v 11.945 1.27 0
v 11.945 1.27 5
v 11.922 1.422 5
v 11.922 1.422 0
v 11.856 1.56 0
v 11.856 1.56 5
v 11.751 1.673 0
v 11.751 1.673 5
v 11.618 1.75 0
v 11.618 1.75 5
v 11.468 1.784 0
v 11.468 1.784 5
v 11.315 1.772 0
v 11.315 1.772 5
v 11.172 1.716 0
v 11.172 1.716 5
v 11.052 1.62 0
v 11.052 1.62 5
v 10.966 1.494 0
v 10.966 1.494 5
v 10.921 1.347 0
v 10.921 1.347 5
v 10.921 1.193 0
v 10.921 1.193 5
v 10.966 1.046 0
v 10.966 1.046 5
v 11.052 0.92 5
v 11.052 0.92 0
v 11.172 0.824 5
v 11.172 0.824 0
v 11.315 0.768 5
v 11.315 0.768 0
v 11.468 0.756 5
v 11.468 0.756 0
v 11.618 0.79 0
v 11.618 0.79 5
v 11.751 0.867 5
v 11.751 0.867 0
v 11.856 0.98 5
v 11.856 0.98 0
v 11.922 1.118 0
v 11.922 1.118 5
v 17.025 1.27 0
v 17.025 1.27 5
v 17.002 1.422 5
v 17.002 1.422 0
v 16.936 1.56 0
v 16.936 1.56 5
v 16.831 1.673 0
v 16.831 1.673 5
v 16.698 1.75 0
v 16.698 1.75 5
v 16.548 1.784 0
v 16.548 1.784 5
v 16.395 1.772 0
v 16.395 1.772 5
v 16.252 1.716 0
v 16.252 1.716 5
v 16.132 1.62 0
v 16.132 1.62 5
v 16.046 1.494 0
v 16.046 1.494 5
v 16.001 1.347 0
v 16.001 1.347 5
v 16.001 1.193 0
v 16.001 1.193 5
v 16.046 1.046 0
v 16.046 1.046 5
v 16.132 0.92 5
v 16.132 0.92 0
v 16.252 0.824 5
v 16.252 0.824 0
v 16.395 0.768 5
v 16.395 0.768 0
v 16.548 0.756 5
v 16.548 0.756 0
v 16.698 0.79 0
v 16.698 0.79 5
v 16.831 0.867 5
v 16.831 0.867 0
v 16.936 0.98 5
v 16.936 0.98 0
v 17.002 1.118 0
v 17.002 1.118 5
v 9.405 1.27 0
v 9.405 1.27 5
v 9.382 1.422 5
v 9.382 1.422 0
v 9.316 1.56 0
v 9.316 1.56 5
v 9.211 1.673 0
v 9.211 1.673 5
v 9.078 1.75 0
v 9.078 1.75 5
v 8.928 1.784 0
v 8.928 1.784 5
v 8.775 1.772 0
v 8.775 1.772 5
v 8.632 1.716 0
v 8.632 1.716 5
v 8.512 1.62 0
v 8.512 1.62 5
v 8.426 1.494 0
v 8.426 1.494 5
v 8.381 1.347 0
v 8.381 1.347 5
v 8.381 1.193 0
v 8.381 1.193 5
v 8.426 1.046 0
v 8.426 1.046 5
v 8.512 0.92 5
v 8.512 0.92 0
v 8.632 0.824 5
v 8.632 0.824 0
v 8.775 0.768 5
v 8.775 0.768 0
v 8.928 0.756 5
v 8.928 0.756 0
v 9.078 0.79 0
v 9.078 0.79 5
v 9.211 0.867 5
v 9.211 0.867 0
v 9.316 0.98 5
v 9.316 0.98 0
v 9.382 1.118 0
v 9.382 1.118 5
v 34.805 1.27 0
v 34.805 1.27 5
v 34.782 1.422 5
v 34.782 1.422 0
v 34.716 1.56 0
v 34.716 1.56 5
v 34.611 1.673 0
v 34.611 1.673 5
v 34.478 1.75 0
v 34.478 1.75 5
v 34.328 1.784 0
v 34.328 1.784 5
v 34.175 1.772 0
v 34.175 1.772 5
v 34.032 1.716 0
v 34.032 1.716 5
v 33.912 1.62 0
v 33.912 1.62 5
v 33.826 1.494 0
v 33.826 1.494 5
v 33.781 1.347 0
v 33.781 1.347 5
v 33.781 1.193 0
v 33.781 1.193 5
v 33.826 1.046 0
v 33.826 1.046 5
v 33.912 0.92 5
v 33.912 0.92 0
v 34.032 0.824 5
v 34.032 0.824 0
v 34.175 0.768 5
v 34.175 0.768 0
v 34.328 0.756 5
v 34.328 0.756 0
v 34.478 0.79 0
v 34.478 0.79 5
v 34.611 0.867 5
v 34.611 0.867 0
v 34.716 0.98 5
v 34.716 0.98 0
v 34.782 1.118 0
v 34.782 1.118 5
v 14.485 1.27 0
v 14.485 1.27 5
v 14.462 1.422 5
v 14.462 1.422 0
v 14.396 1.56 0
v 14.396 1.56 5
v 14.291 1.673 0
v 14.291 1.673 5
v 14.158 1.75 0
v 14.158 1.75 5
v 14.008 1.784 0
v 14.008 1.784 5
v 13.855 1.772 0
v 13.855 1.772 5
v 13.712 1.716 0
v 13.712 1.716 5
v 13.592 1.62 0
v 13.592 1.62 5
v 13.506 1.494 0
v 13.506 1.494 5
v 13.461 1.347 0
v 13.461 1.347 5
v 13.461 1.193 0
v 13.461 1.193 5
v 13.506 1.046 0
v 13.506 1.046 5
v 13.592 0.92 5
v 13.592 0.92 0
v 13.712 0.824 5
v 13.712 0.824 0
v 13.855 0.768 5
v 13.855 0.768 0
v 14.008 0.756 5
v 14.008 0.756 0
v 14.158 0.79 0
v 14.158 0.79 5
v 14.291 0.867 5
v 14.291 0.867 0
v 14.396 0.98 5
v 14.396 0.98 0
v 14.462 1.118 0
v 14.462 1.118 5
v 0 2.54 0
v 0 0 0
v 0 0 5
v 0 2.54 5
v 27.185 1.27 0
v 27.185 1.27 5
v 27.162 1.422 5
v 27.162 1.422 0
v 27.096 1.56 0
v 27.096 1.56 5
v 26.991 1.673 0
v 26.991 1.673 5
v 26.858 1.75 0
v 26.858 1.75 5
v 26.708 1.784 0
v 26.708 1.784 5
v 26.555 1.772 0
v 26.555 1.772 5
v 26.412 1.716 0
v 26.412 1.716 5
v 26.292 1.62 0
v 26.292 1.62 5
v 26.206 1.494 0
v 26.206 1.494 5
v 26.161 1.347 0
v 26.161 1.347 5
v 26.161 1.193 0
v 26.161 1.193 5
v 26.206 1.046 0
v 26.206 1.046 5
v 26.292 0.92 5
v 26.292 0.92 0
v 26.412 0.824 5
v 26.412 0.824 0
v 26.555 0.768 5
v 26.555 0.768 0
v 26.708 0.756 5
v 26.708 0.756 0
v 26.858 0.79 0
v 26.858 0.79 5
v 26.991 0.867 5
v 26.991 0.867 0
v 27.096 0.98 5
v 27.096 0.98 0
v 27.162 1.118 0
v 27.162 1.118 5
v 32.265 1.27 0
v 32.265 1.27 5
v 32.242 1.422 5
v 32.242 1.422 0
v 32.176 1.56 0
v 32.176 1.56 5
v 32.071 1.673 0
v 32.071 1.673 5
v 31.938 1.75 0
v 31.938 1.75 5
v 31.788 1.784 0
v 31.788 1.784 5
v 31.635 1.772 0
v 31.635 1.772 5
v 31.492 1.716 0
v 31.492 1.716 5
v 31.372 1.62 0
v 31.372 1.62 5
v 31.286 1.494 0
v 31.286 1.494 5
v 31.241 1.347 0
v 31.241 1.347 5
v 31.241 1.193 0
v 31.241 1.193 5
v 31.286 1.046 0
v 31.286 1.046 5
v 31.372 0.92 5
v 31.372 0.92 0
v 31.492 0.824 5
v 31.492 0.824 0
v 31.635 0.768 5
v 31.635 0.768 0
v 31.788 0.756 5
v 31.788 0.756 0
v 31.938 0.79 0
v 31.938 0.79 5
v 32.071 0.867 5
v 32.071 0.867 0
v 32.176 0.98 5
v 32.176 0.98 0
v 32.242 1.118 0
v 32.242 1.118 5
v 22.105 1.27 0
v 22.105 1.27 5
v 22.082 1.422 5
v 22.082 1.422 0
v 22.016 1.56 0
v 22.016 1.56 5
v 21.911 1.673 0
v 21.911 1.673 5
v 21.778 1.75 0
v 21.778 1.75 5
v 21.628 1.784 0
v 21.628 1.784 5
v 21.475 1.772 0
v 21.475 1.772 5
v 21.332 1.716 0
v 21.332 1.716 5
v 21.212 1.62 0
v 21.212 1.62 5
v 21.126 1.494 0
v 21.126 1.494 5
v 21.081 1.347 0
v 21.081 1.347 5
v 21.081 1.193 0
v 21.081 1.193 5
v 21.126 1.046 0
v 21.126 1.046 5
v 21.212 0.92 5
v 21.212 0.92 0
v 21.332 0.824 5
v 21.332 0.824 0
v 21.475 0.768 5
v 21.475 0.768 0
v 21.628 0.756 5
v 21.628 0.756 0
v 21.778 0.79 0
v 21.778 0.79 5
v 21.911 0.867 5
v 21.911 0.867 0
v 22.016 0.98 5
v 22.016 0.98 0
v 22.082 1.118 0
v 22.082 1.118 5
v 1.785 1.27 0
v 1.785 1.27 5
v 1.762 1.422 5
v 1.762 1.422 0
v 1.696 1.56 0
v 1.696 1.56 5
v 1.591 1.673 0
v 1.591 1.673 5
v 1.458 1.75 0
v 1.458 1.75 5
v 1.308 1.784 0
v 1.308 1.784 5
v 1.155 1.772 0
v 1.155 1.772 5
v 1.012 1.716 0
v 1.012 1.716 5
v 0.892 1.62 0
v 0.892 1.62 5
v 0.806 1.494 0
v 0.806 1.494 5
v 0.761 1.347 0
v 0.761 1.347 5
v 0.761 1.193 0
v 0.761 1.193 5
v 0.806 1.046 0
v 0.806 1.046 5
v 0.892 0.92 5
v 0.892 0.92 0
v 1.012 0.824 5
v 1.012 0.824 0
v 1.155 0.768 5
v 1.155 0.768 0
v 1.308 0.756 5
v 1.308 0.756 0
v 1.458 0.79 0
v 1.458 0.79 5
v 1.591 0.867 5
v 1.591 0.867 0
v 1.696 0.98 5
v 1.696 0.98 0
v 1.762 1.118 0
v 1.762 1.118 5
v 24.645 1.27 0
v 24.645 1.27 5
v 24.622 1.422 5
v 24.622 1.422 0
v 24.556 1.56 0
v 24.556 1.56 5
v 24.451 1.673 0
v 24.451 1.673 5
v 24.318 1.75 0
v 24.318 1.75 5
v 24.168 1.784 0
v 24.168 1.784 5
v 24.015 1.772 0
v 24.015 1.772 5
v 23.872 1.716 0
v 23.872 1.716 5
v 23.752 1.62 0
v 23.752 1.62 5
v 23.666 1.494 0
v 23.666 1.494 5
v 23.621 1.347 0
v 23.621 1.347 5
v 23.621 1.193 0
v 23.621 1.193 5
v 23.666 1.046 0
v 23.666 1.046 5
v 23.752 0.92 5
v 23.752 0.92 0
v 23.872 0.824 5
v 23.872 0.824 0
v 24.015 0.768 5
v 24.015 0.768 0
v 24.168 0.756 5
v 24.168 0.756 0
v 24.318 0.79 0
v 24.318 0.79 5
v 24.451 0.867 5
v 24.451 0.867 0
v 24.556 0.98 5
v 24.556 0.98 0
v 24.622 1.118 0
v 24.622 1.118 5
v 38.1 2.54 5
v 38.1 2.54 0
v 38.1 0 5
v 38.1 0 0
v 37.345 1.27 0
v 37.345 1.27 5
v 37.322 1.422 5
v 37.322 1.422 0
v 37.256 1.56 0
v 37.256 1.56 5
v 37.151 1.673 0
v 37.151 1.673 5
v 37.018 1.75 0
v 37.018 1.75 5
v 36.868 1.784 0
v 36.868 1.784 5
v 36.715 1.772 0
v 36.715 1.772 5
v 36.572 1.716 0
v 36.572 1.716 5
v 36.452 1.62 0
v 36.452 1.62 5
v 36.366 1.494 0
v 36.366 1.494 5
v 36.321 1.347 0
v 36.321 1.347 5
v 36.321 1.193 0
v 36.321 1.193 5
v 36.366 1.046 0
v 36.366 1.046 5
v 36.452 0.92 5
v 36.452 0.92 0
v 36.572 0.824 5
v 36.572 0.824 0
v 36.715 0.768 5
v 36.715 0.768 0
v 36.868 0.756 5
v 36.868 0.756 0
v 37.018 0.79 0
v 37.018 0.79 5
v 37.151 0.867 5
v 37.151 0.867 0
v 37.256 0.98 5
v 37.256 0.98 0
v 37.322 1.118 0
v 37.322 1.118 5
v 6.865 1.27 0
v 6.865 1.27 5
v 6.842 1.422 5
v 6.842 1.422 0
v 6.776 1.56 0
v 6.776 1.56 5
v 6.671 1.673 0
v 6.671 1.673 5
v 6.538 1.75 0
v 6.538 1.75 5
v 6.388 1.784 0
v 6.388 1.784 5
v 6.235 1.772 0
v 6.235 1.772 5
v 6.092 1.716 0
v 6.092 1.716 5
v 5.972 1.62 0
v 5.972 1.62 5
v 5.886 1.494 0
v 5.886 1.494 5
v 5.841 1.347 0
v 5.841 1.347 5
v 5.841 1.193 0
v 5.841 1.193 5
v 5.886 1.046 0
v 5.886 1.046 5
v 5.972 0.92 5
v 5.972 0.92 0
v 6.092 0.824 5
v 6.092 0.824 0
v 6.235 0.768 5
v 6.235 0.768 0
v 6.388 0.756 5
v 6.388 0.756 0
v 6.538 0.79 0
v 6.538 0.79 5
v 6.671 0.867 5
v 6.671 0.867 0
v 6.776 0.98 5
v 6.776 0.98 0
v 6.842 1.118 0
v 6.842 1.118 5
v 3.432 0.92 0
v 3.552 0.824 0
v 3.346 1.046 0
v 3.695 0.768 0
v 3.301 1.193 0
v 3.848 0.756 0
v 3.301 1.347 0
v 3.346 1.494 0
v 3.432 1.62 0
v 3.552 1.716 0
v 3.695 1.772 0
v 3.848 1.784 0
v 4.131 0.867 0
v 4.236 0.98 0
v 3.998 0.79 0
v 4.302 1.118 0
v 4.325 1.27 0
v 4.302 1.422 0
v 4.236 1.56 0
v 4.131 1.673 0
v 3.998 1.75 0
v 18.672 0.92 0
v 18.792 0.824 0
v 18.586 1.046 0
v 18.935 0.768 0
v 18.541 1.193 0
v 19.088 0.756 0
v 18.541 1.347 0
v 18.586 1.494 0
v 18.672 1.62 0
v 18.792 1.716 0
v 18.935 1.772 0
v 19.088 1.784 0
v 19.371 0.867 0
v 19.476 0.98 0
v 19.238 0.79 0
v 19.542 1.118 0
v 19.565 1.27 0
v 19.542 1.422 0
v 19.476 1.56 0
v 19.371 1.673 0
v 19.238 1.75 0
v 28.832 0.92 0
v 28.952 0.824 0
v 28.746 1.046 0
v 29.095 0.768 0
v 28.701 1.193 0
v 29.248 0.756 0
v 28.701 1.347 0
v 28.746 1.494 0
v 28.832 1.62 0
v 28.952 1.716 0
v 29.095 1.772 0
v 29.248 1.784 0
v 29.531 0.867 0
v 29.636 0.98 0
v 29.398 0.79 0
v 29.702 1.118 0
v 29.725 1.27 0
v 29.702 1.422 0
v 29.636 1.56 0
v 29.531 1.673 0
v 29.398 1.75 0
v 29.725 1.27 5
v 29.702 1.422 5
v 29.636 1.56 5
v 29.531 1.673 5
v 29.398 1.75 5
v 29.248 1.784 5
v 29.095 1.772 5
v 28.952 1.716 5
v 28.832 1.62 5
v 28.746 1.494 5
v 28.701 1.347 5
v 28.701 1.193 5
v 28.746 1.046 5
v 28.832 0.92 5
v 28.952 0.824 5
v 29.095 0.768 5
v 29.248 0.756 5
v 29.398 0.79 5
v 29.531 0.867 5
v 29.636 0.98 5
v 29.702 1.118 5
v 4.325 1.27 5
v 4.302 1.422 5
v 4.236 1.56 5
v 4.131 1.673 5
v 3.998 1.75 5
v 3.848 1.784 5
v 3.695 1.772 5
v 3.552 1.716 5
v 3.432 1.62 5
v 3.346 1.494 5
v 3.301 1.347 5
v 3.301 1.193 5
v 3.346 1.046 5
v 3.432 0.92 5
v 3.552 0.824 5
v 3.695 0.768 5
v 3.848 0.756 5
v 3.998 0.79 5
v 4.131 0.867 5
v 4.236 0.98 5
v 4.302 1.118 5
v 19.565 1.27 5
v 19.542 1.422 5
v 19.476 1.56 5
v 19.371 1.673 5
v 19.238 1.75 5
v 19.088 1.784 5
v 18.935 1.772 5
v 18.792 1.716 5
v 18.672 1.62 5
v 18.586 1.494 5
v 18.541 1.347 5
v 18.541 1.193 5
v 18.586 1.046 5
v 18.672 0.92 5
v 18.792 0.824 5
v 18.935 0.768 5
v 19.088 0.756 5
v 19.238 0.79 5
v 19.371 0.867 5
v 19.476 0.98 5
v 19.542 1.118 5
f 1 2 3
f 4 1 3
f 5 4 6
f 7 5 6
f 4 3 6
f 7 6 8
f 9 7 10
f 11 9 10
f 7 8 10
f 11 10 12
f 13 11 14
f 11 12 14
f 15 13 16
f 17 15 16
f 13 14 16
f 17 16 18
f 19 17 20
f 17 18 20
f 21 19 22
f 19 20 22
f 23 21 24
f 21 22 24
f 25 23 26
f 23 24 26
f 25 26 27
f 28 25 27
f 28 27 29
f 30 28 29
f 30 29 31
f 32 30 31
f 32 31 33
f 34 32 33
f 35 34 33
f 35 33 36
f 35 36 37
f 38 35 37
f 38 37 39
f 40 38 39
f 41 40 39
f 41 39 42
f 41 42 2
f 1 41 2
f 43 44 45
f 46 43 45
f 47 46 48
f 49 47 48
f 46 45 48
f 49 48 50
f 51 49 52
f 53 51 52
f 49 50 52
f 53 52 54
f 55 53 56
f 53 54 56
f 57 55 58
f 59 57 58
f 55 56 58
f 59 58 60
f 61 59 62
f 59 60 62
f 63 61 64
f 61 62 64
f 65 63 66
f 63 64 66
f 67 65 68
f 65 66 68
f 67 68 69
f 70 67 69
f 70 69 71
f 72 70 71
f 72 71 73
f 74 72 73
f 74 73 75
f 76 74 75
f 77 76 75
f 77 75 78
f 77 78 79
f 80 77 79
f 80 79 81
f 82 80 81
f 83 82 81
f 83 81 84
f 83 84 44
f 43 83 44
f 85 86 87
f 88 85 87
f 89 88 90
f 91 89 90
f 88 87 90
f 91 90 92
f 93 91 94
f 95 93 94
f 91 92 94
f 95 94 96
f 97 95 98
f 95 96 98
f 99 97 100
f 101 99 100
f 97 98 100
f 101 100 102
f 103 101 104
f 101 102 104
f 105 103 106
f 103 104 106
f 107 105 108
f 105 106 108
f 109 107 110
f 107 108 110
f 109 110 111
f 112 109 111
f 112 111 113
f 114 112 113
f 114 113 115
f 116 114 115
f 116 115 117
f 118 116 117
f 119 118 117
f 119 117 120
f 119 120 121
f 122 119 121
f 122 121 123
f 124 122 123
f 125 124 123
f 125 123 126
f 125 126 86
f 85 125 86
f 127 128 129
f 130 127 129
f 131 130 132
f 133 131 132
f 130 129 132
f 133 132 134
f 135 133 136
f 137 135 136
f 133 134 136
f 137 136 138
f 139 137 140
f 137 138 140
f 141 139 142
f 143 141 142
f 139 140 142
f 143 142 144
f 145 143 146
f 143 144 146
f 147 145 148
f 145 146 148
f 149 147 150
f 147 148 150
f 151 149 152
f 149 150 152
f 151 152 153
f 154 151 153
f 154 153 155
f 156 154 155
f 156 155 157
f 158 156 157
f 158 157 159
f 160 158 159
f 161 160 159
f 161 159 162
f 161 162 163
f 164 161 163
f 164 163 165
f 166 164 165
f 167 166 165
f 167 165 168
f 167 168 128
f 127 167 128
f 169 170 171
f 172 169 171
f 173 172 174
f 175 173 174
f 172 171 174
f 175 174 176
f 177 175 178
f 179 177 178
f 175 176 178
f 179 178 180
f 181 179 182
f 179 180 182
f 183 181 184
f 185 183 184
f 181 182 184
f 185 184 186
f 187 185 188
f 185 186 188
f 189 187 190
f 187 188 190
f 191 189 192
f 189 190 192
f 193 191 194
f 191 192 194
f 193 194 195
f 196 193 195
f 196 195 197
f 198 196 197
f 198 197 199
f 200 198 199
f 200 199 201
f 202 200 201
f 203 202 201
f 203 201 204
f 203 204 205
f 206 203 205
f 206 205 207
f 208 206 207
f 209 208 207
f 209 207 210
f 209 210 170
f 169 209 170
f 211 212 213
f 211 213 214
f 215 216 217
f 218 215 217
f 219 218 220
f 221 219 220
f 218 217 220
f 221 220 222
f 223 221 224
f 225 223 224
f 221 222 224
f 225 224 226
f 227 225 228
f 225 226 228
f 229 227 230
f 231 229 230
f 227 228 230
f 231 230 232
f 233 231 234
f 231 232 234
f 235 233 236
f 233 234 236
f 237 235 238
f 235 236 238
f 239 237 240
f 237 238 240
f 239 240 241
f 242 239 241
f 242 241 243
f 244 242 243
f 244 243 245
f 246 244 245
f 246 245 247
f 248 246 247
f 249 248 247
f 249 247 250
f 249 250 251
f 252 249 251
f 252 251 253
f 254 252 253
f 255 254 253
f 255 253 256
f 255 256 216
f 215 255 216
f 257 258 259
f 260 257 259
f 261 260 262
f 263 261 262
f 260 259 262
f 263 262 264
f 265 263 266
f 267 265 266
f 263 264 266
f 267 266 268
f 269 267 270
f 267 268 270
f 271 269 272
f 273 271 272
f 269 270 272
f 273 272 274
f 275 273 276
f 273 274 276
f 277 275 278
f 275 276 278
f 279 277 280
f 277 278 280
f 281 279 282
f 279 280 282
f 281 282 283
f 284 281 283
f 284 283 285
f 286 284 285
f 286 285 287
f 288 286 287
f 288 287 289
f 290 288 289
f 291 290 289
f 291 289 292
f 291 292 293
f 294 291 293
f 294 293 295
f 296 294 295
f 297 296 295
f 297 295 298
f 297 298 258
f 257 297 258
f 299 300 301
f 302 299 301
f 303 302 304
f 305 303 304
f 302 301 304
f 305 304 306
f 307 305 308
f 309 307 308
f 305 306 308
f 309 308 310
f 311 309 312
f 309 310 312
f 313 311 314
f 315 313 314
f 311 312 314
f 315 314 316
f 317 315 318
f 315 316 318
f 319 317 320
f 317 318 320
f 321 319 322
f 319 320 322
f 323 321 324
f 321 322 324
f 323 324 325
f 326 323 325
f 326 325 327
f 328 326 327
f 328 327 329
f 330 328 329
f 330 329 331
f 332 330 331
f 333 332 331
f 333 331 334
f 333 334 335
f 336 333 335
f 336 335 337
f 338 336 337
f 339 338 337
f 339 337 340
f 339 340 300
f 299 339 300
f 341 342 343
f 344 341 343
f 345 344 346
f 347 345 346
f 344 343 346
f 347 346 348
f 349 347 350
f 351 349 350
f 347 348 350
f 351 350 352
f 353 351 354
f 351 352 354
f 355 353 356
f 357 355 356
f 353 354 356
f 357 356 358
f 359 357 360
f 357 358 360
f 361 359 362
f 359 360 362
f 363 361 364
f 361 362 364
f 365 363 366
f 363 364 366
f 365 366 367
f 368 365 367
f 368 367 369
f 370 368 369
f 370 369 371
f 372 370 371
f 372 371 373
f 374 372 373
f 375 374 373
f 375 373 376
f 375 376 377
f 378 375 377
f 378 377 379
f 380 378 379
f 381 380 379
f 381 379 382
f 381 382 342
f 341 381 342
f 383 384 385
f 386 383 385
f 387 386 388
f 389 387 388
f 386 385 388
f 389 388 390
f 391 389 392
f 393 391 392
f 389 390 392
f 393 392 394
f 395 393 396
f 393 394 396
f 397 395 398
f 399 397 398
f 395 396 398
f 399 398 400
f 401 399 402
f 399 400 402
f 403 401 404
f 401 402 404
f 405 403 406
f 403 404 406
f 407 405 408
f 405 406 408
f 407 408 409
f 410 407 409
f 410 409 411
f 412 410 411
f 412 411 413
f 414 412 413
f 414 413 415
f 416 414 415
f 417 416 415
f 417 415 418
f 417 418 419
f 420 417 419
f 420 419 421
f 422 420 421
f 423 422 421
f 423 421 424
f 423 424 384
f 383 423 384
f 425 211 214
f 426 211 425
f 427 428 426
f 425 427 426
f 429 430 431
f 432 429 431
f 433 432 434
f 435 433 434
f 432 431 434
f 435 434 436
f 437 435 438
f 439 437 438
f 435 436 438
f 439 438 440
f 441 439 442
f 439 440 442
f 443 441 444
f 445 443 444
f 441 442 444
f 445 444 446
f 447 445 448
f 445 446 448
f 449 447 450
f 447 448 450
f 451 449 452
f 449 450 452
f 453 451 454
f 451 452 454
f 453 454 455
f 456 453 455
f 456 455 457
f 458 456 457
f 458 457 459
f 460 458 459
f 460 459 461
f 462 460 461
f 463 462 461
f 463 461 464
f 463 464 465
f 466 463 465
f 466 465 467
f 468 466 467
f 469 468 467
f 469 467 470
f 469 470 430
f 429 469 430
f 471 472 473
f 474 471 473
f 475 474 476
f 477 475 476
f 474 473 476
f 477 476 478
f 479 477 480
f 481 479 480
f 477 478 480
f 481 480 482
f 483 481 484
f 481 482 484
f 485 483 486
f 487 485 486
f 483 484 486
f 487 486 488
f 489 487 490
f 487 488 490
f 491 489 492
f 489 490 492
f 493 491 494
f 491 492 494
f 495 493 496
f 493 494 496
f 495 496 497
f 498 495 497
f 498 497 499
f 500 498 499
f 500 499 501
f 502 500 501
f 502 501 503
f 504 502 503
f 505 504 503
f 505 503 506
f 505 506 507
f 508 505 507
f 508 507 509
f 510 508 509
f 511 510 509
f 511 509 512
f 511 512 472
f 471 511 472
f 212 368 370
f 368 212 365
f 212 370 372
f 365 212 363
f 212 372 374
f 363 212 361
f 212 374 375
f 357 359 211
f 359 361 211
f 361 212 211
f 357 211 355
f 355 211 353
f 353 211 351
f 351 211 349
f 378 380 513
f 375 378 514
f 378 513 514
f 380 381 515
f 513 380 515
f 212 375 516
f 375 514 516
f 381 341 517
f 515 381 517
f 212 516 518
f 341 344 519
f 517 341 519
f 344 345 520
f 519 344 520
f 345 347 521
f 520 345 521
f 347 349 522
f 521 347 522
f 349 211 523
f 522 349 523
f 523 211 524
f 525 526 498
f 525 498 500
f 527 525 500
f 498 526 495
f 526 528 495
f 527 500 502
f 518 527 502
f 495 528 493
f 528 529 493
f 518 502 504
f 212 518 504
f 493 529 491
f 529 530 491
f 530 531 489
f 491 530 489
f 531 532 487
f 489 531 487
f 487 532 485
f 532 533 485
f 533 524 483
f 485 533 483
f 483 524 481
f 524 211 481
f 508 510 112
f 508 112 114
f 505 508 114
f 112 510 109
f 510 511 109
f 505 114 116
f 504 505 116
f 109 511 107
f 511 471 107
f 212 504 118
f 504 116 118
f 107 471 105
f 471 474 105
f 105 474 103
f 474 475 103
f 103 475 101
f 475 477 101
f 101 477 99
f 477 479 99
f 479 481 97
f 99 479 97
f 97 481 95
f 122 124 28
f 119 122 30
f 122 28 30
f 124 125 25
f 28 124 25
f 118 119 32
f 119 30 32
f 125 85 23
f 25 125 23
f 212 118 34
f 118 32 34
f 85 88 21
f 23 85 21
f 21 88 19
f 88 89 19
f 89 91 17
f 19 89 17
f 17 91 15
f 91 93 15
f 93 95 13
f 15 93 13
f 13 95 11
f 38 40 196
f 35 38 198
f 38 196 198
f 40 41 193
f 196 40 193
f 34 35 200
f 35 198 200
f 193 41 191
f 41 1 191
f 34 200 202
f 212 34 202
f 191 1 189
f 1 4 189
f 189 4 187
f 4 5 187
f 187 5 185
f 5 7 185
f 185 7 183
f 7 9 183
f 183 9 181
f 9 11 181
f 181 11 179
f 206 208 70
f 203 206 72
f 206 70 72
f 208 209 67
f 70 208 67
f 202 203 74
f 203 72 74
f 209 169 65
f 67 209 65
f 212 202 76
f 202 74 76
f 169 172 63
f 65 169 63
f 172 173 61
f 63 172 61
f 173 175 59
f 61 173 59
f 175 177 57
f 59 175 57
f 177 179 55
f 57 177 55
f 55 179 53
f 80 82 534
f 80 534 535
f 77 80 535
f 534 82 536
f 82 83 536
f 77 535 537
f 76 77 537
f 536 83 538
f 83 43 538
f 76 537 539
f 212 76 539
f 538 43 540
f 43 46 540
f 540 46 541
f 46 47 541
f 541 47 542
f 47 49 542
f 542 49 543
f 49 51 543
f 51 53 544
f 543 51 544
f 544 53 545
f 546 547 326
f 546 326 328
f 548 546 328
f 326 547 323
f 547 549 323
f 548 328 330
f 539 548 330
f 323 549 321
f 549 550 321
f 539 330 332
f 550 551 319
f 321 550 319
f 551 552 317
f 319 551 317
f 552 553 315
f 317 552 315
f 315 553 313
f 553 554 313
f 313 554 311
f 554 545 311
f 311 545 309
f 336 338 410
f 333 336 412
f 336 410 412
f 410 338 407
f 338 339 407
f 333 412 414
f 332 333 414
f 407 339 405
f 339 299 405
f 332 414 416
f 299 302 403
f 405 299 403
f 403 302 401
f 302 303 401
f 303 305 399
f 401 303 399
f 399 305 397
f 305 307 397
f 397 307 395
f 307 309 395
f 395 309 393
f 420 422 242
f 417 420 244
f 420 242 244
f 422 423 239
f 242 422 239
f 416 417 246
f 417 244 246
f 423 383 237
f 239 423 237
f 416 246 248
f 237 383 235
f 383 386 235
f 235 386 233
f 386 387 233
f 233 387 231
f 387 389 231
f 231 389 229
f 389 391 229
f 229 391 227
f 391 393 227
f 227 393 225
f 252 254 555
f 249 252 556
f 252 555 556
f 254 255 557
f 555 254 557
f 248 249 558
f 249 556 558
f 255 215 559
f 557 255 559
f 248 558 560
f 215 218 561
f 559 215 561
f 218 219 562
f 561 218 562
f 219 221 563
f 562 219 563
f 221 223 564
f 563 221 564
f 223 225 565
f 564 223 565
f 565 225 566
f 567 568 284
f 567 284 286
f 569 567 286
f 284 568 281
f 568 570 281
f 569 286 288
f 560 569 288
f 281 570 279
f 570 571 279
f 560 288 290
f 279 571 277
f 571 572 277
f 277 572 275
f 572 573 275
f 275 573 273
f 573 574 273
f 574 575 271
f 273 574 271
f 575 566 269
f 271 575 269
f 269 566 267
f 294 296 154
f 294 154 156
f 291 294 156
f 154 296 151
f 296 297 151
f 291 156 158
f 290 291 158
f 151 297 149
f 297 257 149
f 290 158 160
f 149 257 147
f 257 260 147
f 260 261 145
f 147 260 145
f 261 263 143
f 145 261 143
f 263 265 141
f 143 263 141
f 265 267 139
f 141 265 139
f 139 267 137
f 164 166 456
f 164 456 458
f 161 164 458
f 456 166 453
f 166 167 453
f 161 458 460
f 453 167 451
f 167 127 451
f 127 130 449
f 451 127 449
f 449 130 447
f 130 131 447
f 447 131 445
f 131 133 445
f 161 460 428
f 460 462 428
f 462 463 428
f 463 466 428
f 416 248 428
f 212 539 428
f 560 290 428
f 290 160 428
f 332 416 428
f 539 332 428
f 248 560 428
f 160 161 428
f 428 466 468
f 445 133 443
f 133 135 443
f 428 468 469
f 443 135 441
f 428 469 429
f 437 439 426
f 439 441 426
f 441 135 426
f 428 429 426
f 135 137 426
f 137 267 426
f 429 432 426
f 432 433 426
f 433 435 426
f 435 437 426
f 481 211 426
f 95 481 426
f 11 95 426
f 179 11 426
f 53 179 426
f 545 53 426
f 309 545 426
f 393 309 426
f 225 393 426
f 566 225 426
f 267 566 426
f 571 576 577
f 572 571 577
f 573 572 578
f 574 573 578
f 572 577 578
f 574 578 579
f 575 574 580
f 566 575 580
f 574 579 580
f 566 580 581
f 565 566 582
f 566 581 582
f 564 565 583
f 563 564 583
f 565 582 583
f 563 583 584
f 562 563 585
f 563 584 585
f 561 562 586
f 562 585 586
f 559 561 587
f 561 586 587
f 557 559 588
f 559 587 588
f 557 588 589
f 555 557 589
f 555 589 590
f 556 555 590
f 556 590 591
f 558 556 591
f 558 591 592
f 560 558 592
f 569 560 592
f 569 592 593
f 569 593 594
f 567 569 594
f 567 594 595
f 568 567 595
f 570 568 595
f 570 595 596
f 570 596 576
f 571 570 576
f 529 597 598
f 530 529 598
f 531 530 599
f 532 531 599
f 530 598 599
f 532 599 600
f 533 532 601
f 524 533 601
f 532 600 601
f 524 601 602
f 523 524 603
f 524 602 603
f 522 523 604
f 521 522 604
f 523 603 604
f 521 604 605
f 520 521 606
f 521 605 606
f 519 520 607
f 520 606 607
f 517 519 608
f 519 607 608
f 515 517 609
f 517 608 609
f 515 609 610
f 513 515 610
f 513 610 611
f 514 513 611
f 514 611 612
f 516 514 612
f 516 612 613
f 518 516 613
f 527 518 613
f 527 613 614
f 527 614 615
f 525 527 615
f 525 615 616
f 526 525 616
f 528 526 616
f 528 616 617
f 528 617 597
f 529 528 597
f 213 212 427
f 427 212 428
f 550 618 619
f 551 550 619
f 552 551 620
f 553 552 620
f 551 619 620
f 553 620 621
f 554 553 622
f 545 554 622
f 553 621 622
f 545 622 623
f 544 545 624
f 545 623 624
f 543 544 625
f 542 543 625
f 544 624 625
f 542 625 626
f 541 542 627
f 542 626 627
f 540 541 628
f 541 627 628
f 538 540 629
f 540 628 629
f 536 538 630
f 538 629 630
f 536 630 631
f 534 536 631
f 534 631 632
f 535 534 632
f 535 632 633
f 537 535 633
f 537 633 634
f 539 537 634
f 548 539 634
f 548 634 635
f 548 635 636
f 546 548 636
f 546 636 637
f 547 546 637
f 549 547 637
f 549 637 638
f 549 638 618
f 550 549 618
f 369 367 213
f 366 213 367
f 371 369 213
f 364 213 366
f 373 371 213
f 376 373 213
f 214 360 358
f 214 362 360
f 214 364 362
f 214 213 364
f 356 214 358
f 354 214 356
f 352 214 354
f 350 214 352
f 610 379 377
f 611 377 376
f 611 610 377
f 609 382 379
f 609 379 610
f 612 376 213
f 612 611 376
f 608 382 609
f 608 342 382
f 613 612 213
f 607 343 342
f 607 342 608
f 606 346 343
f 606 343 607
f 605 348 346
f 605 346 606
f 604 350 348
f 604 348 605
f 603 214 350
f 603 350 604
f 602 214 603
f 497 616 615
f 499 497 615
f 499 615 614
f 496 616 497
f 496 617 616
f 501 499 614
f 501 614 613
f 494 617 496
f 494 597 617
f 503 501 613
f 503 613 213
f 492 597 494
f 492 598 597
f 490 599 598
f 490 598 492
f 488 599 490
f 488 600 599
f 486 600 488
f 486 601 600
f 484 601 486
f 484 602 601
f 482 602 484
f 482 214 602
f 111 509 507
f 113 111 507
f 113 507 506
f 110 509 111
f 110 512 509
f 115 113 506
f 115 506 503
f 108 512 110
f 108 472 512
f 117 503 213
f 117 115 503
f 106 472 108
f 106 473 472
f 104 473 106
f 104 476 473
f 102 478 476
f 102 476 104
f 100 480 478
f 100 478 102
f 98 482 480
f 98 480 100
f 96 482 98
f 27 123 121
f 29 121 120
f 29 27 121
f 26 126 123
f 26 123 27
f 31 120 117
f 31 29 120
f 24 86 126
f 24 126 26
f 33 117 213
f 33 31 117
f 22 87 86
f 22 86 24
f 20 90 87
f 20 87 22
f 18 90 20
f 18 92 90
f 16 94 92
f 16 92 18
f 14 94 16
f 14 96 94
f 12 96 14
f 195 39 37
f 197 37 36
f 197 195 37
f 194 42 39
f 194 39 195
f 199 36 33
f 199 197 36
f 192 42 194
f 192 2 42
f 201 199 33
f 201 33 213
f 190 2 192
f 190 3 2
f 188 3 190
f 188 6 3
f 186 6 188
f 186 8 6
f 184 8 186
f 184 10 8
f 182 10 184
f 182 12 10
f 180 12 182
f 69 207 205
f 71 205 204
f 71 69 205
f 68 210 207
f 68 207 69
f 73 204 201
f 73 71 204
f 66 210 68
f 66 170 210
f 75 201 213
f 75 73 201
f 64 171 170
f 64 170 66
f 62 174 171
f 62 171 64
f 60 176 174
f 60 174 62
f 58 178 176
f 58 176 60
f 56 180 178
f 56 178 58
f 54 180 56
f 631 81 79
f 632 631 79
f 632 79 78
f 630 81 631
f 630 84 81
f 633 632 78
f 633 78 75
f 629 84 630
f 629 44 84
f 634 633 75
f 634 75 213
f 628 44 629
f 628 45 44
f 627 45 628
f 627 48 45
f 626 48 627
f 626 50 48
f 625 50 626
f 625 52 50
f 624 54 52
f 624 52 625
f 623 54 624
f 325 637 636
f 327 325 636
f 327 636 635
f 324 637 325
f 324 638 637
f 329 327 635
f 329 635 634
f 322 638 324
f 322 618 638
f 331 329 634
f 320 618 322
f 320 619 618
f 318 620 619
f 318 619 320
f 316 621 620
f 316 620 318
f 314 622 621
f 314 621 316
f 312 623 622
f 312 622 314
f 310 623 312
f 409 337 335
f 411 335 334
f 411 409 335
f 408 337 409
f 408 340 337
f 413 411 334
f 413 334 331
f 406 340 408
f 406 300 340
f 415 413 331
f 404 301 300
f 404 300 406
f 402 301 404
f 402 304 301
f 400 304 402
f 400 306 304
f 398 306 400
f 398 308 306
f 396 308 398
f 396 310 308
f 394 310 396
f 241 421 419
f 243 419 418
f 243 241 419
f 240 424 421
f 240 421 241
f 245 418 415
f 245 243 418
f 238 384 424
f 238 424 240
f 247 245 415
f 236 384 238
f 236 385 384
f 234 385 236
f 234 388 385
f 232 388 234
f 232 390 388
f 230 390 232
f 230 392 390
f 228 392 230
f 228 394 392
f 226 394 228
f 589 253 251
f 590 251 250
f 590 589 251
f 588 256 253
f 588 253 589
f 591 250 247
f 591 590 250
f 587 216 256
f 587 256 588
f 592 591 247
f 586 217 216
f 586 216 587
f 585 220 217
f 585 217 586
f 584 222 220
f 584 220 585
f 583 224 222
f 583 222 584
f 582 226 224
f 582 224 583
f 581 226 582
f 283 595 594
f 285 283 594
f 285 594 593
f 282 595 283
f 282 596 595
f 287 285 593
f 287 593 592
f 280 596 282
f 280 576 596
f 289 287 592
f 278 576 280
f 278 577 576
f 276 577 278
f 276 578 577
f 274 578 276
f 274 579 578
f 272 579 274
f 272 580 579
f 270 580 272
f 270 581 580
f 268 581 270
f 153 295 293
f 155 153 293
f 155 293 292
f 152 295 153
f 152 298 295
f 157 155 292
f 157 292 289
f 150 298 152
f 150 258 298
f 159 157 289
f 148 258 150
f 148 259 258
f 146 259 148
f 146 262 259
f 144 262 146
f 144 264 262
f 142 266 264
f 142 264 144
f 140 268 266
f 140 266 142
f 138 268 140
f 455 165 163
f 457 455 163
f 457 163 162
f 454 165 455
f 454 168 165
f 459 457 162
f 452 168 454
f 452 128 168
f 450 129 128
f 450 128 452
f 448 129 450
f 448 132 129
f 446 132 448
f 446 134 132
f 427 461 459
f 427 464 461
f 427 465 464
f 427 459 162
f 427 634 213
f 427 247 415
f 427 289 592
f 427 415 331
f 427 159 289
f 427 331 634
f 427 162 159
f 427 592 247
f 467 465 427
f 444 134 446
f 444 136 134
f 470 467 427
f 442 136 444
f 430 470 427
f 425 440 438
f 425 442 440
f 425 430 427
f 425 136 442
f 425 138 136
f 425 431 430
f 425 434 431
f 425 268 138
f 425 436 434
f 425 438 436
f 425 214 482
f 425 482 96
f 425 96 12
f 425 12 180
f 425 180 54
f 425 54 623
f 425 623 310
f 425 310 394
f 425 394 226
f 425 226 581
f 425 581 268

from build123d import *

# Parameters (mm, degrees)
SKETCH1_W           = 38.1
SKETCH1_H           = 2.54
BOSS_EXTRUDE1_DEPTH = 5
SKETCH2_R           = 0.515143842
CUT_EXTRUDE1_DEPTH  = 39.510538817


with BuildPart() as part:
    # Sketch1 → Boss-Extrude1 (new body)
    with BuildSketch(Plane.XY):
        with Locations((19.05, 1.27)):
            Rectangle(SKETCH1_W, SKETCH1_H)
    extrude(amount=BOSS_EXTRUDE1_DEPTH)

    # Sketch2 → Cut-Extrude1 (cut, through all)
    with BuildSketch(Plane.XY.offset(5)):
        with Locations((1.27, 1.27)):
            Circle(SKETCH2_R)
        with Locations((3.81, 1.27)):
            Circle(SKETCH2_R)
        with Locations((6.35, 1.27)):
            Circle(SKETCH2_R)
        with Locations((8.89, 1.27)):
            Circle(SKETCH2_R)
        with Locations((11.43, 1.27)):
            Circle(SKETCH2_R)
        with Locations((13.97, 1.27)):
            Circle(SKETCH2_R)
        with Locations((16.51, 1.27)):
            Circle(SKETCH2_R)
        with Locations((19.05, 1.27)):
            Circle(SKETCH2_R)
        with Locations((21.59, 1.27)):
            Circle(SKETCH2_R)
        with Locations((24.13, 1.27)):
            Circle(SKETCH2_R)
        with Locations((26.67, 1.27)):
            Circle(SKETCH2_R)
        with Locations((29.21, 1.27)):
            Circle(SKETCH2_R)
        with Locations((31.75, 1.27)):
            Circle(SKETCH2_R)
        with Locations((34.29, 1.27)):
            Circle(SKETCH2_R)
        with Locations((36.83, 1.27)):
            Circle(SKETCH2_R)
    extrude(amount=-CUT_EXTRUDE1_DEPTH, mode=Mode.SUBTRACT)


solid = part.part
